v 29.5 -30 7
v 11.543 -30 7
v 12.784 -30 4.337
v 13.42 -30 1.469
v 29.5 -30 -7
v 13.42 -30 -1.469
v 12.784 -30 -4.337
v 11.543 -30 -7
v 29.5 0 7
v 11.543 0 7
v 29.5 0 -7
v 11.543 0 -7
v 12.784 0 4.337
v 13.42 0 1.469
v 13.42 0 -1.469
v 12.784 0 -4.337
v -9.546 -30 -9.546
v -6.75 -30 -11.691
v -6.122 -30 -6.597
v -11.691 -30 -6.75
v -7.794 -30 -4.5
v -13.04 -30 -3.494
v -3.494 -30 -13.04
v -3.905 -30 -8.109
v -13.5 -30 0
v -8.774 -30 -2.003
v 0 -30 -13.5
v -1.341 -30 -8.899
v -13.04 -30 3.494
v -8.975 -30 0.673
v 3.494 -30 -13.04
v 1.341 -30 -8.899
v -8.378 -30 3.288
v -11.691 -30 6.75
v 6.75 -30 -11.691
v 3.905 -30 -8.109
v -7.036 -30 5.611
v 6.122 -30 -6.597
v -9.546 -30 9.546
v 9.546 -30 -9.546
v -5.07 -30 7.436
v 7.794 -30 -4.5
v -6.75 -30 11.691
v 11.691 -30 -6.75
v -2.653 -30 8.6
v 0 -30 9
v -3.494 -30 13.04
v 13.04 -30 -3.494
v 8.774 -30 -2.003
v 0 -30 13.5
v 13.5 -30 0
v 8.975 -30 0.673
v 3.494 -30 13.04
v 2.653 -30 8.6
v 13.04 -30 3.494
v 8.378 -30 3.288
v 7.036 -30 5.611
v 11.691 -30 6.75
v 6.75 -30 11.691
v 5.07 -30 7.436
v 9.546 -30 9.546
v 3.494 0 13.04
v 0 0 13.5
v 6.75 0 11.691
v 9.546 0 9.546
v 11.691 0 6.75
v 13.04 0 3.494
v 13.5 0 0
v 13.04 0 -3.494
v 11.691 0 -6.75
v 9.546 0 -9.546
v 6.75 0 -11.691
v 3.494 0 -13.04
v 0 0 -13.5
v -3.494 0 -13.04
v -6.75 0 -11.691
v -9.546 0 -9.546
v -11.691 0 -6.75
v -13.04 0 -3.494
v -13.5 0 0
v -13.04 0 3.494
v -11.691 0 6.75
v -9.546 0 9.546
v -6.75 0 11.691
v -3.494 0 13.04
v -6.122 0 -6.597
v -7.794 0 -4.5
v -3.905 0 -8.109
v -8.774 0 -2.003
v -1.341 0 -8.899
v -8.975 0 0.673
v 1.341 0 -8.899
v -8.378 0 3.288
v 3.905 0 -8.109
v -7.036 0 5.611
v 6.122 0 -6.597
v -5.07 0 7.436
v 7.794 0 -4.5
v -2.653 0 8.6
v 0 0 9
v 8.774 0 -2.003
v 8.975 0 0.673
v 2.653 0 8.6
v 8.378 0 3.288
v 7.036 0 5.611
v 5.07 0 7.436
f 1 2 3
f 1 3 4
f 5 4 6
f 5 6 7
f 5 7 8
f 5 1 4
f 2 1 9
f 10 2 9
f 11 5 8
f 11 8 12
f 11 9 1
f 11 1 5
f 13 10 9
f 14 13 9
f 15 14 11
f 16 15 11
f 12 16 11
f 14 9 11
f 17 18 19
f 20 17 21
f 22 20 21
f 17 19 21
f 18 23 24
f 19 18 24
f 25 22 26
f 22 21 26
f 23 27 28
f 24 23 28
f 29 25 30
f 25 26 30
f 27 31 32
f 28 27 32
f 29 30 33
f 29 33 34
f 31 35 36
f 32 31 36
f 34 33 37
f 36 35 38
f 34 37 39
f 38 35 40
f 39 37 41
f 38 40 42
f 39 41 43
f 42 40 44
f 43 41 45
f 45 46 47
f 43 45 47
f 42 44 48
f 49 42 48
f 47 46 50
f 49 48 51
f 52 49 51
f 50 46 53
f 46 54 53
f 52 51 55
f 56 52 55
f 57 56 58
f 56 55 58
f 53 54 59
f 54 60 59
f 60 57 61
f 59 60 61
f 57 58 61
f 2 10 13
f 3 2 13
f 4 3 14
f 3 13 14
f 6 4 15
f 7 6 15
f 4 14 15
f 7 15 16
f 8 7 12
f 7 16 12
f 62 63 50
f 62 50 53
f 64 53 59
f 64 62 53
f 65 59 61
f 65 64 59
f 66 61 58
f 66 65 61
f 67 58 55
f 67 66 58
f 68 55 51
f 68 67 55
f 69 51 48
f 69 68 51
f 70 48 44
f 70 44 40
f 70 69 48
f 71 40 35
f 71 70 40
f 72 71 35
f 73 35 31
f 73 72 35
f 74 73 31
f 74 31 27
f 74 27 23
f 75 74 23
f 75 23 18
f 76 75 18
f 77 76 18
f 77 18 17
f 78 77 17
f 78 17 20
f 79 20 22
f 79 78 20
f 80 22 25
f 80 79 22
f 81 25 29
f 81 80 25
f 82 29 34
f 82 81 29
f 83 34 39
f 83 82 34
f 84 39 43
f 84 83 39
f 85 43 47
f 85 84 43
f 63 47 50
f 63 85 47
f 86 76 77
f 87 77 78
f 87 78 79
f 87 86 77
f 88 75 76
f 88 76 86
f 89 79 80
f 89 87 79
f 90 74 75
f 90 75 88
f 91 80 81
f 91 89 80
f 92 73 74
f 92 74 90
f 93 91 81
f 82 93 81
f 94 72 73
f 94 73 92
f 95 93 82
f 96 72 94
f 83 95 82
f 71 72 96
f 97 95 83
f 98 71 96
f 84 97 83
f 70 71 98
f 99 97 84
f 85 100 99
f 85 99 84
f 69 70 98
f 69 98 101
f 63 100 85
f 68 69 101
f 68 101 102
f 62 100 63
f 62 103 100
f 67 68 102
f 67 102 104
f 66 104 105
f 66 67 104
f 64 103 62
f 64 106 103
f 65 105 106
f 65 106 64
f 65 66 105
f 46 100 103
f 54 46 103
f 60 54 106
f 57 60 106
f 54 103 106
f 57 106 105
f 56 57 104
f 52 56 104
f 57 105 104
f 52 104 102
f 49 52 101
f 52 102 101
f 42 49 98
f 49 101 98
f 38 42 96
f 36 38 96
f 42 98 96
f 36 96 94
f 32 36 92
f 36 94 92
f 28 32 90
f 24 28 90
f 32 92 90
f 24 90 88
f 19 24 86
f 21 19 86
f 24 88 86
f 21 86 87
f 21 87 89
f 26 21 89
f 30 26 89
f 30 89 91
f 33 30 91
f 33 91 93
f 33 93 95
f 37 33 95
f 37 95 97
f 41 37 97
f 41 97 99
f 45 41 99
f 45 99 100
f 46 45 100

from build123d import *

# Parameters (mm, degrees)
SKETCH1_R                = 13.5
BOSS_EXTRUDE1_DEPTH      = 30
SKETCH2_R                = 9
CUT_EXTRUDE1_DEPTH       = 36.559808773
BOSS_EXTRUDE3_REACH      = 56.141
BOSS_EXTRUDE3_END_RADIUS = 13.5
SKETCH3_W                = 14
SKETCH3_H                = 30


with BuildPart() as part:
    # Sketch1 → Boss-Extrude1 (new body)
    with BuildSketch(Plane(origin=(0, 0, 0), x_dir=(1, 0, 0), z_dir=(0, 1, 0))):
        with Locations(Location((0, 0, 0), (0, 0, 270))):
            Circle(SKETCH1_R)
    extrude(amount=-BOSS_EXTRUDE1_DEPTH)

    # Sketch2 → Cut-Extrude1 (cut, through all)
    with BuildSketch(Plane(origin=(0, 0, 0), x_dir=(1, 0, 0), z_dir=(0, 1, 0))):
        with Locations(Location((0, 0, 0), (0, 0, 270))):
            Circle(SKETCH2_R)
    extrude(amount=-CUT_EXTRUDE1_DEPTH, mode=Mode.SUBTRACT)


with BuildPart() as body_2:
    # Boss-Extrude3: up to this cylinder (the profile starts outside it)
    boss_extrude3_end = Plane(origin=(0, -15, 0), z_dir=(0, 1, 0)) * Cylinder(BOSS_EXTRUDE3_END_RADIUS, 140.282, mode=Mode.PRIVATE)
    # Sketch3 → Boss-Extrude3 (new, up to the surface)
    with BuildSketch(Plane(origin=(29.5, 0, 0), x_dir=(0, 0, -1), z_dir=(1, 0, 0)), mode=Mode.PRIVATE) as boss_extrude3_sk1:
        with Locations((0, -15)):
            Rectangle(SKETCH3_W, SKETCH3_H)
    boss_extrude3_tool1 = extrude(boss_extrude3_sk1.sketch, amount=-BOSS_EXTRUDE3_REACH, mode=Mode.PRIVATE) - boss_extrude3_end
    add(boss_extrude3_tool1.solids().sort_by_distance((29.5, -15, 0))[0])


solid = Compound([part.part, body_2.part])
